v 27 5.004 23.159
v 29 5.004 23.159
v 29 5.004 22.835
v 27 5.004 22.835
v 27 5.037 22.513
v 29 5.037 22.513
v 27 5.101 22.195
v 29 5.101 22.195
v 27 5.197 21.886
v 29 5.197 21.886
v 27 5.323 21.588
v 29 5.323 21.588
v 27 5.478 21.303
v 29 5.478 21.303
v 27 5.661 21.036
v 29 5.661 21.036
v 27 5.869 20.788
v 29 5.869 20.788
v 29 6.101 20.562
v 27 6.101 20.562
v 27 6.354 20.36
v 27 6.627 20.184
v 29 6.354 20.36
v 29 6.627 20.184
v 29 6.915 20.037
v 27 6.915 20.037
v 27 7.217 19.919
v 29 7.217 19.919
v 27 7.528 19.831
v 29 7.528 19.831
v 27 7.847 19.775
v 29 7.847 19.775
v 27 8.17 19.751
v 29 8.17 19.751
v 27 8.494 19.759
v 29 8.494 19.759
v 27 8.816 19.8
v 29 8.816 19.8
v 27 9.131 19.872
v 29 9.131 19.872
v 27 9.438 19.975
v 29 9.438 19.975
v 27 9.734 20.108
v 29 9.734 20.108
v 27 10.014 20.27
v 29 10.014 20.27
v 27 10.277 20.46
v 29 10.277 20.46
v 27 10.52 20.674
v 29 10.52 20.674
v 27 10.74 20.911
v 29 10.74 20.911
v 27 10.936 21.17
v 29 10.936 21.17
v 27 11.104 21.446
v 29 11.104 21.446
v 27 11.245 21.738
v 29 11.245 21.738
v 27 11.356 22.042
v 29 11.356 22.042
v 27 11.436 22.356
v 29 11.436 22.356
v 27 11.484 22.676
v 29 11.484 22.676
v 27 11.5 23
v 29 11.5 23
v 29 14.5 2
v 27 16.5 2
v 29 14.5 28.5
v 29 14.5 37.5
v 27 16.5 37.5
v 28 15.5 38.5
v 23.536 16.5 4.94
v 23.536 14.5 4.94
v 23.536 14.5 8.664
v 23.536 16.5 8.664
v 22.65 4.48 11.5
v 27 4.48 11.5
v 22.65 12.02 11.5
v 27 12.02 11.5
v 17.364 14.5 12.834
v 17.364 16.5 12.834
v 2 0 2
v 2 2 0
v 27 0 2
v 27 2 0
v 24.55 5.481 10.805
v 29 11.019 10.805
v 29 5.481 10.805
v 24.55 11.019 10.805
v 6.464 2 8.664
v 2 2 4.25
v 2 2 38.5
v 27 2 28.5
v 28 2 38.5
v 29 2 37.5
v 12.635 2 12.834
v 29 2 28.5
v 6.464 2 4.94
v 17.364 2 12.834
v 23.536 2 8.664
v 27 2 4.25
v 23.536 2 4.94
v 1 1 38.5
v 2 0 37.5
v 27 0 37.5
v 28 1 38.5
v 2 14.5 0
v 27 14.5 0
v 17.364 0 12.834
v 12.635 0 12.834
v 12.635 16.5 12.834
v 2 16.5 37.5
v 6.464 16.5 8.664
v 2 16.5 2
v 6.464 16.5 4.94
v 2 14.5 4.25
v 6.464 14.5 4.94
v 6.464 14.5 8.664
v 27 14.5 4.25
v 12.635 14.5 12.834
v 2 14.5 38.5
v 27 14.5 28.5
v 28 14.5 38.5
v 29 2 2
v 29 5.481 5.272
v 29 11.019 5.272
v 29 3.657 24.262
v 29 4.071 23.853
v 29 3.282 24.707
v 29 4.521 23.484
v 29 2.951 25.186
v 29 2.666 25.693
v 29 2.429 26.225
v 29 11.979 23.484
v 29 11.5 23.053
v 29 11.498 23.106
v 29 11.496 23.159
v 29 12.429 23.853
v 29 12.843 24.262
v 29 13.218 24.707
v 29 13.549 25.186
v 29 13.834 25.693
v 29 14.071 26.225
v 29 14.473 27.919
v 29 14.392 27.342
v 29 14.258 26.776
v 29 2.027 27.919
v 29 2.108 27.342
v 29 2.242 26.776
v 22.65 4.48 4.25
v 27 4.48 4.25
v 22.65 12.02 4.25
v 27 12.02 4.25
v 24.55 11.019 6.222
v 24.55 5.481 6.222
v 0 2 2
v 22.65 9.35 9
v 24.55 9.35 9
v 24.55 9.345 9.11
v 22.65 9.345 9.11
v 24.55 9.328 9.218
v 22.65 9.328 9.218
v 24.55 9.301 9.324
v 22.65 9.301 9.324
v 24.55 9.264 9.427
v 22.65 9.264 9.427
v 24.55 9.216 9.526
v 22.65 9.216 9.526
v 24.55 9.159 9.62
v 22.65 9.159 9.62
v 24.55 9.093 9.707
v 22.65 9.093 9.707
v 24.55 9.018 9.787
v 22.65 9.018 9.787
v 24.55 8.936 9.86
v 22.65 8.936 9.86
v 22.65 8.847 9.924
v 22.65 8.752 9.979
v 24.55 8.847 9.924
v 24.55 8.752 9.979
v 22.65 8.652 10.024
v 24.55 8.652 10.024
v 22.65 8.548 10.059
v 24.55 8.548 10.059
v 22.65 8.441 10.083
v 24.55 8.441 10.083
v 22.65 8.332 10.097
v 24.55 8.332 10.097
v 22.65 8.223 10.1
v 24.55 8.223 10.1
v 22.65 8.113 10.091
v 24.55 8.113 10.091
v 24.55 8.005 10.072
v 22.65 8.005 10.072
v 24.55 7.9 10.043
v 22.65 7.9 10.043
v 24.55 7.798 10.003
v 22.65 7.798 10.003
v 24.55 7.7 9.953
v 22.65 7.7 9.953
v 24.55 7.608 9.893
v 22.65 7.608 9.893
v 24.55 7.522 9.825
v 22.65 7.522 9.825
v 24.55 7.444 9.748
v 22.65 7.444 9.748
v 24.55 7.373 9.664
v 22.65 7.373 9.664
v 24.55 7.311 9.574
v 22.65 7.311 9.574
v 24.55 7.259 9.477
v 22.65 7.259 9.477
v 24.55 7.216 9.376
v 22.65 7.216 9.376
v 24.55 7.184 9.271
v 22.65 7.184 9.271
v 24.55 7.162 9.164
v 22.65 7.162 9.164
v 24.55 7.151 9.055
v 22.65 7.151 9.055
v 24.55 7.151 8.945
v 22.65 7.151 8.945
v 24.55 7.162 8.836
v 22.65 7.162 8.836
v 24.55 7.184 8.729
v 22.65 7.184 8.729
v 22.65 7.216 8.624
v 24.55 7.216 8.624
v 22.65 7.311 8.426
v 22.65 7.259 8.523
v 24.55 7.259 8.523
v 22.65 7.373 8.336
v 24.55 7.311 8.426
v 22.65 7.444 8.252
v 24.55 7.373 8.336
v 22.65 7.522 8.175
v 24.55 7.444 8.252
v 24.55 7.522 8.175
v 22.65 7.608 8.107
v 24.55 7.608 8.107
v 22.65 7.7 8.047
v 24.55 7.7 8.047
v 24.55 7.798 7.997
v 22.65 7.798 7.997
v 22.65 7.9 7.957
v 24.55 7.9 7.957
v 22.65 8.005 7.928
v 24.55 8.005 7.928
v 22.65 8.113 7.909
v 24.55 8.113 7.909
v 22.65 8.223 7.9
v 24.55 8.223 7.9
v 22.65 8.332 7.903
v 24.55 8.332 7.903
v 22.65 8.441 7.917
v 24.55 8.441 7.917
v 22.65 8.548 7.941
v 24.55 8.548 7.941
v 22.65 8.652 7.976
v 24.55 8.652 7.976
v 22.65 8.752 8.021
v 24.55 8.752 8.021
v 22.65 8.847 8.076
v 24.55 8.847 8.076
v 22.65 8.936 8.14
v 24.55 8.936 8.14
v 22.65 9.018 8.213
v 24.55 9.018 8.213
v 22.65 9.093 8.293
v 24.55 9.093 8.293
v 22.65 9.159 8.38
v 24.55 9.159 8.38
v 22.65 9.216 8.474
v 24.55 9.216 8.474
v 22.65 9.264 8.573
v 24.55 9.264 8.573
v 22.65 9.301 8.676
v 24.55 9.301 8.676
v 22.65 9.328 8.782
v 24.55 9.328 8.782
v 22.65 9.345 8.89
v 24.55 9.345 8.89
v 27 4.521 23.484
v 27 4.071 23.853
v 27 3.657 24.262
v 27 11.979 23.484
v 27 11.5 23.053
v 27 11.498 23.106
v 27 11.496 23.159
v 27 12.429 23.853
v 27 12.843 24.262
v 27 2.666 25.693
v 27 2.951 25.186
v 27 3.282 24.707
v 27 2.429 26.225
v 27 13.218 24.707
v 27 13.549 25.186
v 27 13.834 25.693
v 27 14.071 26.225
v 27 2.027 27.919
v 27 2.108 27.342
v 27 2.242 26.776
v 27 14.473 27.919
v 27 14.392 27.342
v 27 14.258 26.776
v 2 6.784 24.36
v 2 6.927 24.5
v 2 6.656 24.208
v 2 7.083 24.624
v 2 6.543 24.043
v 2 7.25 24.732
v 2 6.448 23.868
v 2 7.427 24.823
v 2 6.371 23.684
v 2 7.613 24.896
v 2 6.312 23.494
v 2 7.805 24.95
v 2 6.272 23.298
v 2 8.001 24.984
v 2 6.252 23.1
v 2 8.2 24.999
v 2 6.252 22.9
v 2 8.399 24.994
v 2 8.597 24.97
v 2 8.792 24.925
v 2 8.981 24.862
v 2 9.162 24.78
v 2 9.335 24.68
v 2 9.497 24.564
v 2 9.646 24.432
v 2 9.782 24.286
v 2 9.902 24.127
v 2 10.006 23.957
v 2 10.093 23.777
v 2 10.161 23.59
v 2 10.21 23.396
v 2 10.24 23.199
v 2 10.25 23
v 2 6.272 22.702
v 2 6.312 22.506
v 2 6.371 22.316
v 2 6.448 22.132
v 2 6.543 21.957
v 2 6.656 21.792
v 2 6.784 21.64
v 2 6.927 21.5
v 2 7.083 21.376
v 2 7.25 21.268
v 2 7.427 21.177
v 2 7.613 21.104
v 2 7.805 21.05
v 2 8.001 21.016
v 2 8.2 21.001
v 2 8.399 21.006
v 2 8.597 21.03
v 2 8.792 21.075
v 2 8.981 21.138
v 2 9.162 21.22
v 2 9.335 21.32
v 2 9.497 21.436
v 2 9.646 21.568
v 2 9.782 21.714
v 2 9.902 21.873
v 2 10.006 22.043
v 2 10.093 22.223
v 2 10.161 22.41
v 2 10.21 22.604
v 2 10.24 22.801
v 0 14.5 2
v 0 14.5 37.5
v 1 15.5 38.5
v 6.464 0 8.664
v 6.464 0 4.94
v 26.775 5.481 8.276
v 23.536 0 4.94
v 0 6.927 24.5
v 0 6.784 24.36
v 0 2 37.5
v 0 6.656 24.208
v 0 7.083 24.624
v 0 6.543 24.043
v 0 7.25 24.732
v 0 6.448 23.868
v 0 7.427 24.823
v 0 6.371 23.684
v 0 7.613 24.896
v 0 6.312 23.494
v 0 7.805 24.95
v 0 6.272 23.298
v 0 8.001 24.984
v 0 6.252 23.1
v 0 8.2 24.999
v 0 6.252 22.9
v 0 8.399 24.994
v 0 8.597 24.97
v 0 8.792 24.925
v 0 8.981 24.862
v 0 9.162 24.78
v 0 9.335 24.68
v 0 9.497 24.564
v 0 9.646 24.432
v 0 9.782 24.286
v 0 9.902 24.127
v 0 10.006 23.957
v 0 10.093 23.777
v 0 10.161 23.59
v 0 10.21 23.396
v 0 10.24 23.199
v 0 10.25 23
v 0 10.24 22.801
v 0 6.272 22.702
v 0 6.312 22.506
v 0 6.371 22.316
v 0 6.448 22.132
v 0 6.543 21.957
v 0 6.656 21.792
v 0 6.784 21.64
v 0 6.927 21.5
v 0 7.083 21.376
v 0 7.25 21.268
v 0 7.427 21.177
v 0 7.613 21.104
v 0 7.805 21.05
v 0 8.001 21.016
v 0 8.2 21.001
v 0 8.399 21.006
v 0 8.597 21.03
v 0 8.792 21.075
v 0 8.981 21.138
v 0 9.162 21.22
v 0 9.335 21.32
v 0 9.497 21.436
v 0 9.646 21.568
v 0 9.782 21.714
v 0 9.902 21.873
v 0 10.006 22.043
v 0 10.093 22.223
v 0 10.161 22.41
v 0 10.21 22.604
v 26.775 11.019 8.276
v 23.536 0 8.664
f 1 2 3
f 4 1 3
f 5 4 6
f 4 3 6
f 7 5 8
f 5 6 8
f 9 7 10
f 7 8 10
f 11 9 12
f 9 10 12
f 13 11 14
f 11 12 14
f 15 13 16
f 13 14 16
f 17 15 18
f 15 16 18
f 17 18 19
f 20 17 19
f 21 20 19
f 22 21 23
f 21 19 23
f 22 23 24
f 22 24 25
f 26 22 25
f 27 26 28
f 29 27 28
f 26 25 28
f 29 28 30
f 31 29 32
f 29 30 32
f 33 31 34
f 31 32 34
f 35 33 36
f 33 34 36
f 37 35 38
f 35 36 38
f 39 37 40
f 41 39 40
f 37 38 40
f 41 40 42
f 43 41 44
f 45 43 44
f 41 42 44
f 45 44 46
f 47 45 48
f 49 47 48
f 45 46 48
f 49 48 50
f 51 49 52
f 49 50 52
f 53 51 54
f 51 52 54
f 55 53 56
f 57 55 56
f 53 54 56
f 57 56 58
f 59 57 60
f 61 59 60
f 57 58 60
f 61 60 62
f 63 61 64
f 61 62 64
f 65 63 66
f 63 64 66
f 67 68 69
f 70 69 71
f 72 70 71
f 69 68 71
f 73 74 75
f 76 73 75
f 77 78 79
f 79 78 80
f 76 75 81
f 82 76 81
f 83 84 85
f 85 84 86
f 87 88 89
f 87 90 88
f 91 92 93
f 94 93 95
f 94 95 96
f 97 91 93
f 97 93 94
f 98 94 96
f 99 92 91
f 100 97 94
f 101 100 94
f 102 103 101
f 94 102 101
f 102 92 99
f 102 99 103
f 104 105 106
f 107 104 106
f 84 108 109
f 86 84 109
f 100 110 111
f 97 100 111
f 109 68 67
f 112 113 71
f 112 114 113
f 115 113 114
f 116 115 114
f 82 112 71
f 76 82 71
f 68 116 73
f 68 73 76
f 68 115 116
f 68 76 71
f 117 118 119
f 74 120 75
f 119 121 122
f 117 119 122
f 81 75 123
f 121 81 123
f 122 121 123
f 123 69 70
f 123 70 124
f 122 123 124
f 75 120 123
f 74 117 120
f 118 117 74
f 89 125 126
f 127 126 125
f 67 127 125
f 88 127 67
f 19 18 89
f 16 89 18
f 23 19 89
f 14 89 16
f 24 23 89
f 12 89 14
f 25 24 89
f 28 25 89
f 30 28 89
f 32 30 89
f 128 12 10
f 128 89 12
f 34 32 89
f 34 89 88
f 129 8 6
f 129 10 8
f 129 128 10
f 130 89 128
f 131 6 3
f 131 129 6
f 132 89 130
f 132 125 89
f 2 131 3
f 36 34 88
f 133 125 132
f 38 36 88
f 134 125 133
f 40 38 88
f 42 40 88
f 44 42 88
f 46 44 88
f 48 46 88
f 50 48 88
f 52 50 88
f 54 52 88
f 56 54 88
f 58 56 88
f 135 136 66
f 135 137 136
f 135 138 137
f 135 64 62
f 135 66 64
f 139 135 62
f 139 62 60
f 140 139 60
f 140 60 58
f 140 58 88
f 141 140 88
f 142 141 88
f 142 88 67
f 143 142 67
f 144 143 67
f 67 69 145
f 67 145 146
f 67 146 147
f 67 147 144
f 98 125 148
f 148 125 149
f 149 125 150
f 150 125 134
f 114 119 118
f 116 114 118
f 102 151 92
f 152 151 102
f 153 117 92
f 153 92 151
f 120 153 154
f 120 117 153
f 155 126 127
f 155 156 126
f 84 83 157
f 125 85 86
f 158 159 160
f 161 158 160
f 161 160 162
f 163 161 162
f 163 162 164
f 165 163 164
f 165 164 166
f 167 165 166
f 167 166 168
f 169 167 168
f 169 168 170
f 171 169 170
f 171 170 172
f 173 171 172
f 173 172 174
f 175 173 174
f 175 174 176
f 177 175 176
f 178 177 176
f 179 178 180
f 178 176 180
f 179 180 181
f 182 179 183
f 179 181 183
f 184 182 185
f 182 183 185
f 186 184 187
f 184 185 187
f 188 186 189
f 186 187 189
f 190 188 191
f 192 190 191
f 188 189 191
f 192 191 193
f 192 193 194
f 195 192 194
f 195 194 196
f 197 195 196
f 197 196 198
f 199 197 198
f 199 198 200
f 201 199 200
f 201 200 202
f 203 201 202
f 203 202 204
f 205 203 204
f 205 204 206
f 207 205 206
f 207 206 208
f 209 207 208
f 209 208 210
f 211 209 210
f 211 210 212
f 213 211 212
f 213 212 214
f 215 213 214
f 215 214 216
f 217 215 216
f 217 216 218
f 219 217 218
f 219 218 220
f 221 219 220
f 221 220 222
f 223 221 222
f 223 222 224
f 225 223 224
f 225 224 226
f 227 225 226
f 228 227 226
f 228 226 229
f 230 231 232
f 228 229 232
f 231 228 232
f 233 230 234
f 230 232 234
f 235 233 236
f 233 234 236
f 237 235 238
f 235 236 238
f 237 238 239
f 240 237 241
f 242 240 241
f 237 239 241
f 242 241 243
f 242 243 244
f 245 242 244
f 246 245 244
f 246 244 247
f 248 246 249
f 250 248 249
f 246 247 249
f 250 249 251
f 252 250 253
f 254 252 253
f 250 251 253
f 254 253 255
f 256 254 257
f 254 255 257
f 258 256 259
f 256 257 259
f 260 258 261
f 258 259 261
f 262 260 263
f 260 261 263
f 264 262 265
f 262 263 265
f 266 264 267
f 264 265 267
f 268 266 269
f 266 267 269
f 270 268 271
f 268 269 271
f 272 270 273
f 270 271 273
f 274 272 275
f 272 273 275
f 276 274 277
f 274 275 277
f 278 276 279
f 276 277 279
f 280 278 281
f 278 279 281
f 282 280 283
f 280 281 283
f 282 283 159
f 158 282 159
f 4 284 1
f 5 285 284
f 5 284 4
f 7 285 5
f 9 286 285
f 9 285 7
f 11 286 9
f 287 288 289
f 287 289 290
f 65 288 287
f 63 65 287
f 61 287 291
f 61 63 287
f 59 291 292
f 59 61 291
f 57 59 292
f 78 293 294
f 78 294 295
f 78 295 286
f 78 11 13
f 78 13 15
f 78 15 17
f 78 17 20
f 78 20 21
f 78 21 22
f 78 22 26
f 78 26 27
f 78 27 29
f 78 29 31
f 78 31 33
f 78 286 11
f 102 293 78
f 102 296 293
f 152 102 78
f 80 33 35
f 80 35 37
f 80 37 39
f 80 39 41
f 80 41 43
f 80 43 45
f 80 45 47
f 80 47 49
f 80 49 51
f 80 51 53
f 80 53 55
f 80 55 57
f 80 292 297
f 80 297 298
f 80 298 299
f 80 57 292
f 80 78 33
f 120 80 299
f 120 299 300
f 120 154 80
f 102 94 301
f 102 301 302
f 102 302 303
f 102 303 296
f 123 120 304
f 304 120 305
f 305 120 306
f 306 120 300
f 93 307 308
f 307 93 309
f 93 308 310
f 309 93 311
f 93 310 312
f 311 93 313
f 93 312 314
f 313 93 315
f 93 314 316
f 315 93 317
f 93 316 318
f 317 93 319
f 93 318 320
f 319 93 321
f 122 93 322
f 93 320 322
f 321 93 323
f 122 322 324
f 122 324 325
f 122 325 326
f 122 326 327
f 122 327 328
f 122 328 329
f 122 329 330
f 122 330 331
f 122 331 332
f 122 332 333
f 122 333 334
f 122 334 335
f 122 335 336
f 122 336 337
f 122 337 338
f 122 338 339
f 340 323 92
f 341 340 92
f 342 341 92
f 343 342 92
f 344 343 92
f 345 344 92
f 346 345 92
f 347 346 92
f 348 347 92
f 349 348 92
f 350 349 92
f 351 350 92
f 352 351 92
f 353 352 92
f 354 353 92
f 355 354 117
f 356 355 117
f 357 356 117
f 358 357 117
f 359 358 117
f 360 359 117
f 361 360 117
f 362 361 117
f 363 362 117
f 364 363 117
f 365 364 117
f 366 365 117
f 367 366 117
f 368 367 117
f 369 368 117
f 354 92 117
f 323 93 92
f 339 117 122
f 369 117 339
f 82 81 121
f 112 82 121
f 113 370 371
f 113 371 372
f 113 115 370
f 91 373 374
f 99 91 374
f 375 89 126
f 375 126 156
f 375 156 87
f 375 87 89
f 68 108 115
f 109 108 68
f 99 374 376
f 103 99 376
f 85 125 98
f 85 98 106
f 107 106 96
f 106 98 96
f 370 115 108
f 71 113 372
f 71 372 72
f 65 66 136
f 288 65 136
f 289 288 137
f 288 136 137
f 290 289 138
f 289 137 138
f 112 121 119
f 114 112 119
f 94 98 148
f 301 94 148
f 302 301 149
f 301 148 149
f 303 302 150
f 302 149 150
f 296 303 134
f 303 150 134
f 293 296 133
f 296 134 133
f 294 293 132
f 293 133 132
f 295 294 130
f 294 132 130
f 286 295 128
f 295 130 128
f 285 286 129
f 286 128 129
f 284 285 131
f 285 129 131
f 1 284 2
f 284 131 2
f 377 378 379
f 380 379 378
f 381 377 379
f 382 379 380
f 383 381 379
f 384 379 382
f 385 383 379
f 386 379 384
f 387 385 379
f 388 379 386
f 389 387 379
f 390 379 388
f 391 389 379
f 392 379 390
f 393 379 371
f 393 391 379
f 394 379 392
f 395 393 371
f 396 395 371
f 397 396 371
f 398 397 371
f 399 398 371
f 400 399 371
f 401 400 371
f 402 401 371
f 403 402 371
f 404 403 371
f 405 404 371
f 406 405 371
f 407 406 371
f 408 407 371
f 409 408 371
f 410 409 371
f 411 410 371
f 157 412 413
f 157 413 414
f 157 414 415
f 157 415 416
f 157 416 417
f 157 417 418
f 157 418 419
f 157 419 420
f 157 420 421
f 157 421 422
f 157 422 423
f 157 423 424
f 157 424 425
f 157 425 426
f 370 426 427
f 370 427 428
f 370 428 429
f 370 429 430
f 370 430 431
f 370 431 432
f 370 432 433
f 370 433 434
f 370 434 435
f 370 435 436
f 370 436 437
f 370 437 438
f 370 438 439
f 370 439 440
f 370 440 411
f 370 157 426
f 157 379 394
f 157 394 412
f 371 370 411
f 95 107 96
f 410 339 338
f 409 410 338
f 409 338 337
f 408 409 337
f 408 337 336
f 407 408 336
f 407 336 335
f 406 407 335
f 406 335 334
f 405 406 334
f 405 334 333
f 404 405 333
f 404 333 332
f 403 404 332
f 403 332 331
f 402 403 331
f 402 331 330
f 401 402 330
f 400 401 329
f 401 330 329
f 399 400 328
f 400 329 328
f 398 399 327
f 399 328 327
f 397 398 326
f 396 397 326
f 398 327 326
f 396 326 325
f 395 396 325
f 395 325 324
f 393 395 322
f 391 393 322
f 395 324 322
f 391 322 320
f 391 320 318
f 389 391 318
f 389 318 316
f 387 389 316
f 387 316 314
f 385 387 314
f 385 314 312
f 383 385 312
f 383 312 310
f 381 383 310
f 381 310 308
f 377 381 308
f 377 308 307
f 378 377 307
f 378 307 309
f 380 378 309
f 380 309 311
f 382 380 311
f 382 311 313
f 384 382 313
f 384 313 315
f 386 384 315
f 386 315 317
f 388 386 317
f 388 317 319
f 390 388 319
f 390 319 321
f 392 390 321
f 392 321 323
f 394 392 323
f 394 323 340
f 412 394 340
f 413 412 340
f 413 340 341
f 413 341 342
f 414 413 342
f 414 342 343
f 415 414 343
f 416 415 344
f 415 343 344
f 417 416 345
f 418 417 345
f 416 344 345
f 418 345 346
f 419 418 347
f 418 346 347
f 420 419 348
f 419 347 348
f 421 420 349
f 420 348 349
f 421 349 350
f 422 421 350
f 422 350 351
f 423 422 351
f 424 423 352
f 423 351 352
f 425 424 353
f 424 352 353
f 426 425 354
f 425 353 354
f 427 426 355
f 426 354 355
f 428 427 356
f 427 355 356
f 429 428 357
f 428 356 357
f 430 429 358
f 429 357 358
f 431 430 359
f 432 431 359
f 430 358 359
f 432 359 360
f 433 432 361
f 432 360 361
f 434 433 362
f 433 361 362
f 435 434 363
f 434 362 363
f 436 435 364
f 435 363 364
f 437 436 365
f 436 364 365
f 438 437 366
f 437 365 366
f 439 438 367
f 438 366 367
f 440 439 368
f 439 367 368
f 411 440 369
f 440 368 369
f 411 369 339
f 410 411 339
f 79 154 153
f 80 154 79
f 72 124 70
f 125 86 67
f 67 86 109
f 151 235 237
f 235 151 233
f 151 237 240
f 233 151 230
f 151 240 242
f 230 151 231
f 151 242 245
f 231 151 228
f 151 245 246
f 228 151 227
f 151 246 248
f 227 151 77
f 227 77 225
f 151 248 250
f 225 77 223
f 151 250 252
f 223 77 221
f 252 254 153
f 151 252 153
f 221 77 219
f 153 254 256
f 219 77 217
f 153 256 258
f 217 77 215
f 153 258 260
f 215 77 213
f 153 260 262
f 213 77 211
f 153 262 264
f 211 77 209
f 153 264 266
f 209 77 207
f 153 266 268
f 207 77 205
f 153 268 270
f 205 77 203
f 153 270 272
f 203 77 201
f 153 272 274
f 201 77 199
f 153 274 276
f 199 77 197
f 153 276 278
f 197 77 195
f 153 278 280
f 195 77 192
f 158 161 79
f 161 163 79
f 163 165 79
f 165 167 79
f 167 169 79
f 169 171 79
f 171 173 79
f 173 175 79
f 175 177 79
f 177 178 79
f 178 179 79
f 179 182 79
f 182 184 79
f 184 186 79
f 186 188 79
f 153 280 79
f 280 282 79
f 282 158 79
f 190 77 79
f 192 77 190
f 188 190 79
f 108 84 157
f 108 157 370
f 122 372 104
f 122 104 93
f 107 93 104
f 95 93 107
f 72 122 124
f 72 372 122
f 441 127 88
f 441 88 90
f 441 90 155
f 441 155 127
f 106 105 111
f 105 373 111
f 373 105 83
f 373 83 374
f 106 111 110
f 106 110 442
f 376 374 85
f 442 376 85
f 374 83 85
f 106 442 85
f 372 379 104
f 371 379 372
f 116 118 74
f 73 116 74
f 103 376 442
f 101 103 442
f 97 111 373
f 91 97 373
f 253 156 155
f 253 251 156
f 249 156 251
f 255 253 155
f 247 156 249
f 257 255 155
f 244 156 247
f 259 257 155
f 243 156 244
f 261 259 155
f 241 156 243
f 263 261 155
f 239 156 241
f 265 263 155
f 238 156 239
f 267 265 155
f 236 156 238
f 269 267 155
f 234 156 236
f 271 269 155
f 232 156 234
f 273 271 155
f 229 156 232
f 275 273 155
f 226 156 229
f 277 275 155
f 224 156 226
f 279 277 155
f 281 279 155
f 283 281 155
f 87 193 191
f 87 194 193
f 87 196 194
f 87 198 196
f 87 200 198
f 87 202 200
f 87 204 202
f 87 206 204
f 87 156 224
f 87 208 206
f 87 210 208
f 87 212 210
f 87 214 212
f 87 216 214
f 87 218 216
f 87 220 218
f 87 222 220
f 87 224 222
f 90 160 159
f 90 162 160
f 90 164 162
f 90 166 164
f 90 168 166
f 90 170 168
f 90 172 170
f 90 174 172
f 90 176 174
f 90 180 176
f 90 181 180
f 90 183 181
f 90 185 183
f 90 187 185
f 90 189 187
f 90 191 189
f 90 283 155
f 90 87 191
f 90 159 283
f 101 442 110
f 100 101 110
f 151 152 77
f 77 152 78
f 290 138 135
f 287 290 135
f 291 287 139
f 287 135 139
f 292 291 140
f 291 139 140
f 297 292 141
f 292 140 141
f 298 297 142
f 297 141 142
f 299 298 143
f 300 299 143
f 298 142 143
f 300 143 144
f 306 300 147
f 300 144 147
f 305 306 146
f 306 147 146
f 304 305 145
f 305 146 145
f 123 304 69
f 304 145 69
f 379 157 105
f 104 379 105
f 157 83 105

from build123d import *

# Parameters (mm, degrees)
F0_W      = 29
F0_H      = 16.5
F1_DEPTH  = 38.5
F2_T      = -2
F3_DEPTH  = 2.25
F4_SIZE   = 2
F5_SIZE   = 0.99999
F7_DEPTH  = 16.501
F9_DEPTH  = 2
F10_R     = 2
F11_DEPTH = 2.001
F12_W     = 7.54
F12_H     = 7.25
F12_R     = 1.1
F13_DEPTH = 6.35
F14_W     = 5.538
F14_H     = 5.533
F16_W     = 5.538
F16_H     = 4.583


# Not quite as in the source:
# - a fillet or chamfer is up to 0.001 mm smaller than in the source, because OpenCascade refuses the exact size


with BuildPart() as f1:
    # F0 (on Top) → F1 (new body)
    with BuildSketch(Plane.XY):
        with Locations((14.5, 8.25)):
            Rectangle(F0_W, F0_H)
    extrude(amount=F1_DEPTH)

    # F2
    f2_openings = [f1.faces().sort_by_distance(p)[0] for p in [
        (14.5, 8.25, 38.5),
    ]]
    offset(amount=F2_T, openings=f2_openings)

    # F3 (add): a face of the model
    f3_faces = [f1.faces().sort_by_distance(p)[0] for p in [
        (14.5, 8.25, 2),
    ]]
    extrude(f3_faces, amount=F3_DEPTH)

    # F4
    f4_edges = [f1.edges().sort_by_distance(p)[0] for p in [
        (0, 16.5, 19.25),
        (0, 0, 19.25),
        (29, 16.5, 19.25),
        (29, 0, 19.25),
        (14.5, 16.5, 0),
        (14.5, 0, 0),
        (29, 8.25, 0),
        (0, 8.25, 0),
    ]]
    chamfer(f4_edges, length=F4_SIZE)

    # F5 (size 1 in the source; OpenCascade refuses exactly that, so slightly less here)
    f5_edges = [f1.edges().sort_by_distance(p)[0] for p in [
        (14.5, 16.5, 38.5),
        (14.5, 0, 38.5),
        (0, 8.25, 38.5),
        (29, 8.25, 38.5),
    ]]
    chamfer(f5_edges, length=F5_SIZE)

    # F6 (on face) → F7 (cut, through all)
    with BuildSketch(Plane.XZ):
        Polygon((6.464, 8.664), (6.464, 4.94), (23.536, 4.94), (23.536, 8.664), (17.364, 12.834), (12.635, 12.834), align=None)
    extrude(amount=-F7_DEPTH, mode=Mode.SUBTRACT)

    # F8 (on face) → F9 (cut, through all)
    with BuildSketch(Plane.YZ.offset(29)):
        with BuildLine():
            Line((14.5, 38.5), (2, 38.5))
            Line((2, 38.5), (2, 28.5))
            ThreePointArc((2, 28.5), (8.25, 34.75), (14.5, 28.5))
            Line((14.5, 28.5), (14.5, 38.5))
        make_face()
        with BuildLine():
            ThreePointArc((14.5, 28.5), (8.25, 34.75), (2, 28.5))
            Line((2, 28.5), (14.5, 28.5))
        make_face()
        with BuildLine():
            Line((14.5, 28.5), (2, 28.5))
            ThreePointArc((2, 28.5), (2.8024937382, 25.4361502113), (5.0038961688, 23.1590909091))
            ThreePointArc((5.0038961688, 23.1590909091), (8.25, 26.25), (11.4961038312, 23.1590909091))
            ThreePointArc((11.4961038312, 23.1590909091), (13.6975062618, 25.4361502113), (14.5, 28.5))
        make_face()
        with BuildLine():
            ThreePointArc((11.4961038312, 23.1590909091), (8.25, 26.25), (5.0038961688, 23.1590909091))
            ThreePointArc((5.0038961688, 23.1590909091), (8.25, 22.25), (11.4961038312, 23.1590909091))
        make_face()
        with BuildLine():
            ThreePointArc((11.4961038312, 23.1590909091), (8.25, 22.25), (5.0038961688, 23.1590909091))
            ThreePointArc((5.0038961688, 23.1590909091), (8.1704306945, 19.7509741882), (11.5, 23))
            ThreePointArc((11.5, 23), (11.4990258118, 23.0795693055), (11.4961038312, 23.1590909091))
        make_face()
    extrude(amount=-F9_DEPTH, mode=Mode.SUBTRACT)

    # F10 (on face) → F11 (cut, through all)
    with BuildSketch(Plane.YZ.offset(2)):
        with Locations((8.25, 23)):
            Circle(F10_R)
    extrude(amount=-F11_DEPTH, mode=Mode.SUBTRACT)

    # F12 (on face) → F13 (join)
    with BuildSketch(Plane.YZ.offset(29)):
        with Locations((8.25, 7.875)):
            Rectangle(F12_W, F12_H)
        with Locations((8.25, 9)):
            Circle(F12_R, mode=Mode.SUBTRACT)
    extrude(amount=-F13_DEPTH)

    # F14 (on face) → F17 section 0
    with BuildSketch(Plane.YZ.offset(29)):
        with Locations((8.25, 8.0385)):
            Rectangle(F14_W, F14_H)
    # F16 (on offset) → F17 section 1
    with BuildSketch(Plane.YZ.offset(24.55)):
        with Locations((8.25, 8.5135)):
            Rectangle(F16_W, F16_H)
    loft(mode=Mode.SUBTRACT)


solid = f1.part
